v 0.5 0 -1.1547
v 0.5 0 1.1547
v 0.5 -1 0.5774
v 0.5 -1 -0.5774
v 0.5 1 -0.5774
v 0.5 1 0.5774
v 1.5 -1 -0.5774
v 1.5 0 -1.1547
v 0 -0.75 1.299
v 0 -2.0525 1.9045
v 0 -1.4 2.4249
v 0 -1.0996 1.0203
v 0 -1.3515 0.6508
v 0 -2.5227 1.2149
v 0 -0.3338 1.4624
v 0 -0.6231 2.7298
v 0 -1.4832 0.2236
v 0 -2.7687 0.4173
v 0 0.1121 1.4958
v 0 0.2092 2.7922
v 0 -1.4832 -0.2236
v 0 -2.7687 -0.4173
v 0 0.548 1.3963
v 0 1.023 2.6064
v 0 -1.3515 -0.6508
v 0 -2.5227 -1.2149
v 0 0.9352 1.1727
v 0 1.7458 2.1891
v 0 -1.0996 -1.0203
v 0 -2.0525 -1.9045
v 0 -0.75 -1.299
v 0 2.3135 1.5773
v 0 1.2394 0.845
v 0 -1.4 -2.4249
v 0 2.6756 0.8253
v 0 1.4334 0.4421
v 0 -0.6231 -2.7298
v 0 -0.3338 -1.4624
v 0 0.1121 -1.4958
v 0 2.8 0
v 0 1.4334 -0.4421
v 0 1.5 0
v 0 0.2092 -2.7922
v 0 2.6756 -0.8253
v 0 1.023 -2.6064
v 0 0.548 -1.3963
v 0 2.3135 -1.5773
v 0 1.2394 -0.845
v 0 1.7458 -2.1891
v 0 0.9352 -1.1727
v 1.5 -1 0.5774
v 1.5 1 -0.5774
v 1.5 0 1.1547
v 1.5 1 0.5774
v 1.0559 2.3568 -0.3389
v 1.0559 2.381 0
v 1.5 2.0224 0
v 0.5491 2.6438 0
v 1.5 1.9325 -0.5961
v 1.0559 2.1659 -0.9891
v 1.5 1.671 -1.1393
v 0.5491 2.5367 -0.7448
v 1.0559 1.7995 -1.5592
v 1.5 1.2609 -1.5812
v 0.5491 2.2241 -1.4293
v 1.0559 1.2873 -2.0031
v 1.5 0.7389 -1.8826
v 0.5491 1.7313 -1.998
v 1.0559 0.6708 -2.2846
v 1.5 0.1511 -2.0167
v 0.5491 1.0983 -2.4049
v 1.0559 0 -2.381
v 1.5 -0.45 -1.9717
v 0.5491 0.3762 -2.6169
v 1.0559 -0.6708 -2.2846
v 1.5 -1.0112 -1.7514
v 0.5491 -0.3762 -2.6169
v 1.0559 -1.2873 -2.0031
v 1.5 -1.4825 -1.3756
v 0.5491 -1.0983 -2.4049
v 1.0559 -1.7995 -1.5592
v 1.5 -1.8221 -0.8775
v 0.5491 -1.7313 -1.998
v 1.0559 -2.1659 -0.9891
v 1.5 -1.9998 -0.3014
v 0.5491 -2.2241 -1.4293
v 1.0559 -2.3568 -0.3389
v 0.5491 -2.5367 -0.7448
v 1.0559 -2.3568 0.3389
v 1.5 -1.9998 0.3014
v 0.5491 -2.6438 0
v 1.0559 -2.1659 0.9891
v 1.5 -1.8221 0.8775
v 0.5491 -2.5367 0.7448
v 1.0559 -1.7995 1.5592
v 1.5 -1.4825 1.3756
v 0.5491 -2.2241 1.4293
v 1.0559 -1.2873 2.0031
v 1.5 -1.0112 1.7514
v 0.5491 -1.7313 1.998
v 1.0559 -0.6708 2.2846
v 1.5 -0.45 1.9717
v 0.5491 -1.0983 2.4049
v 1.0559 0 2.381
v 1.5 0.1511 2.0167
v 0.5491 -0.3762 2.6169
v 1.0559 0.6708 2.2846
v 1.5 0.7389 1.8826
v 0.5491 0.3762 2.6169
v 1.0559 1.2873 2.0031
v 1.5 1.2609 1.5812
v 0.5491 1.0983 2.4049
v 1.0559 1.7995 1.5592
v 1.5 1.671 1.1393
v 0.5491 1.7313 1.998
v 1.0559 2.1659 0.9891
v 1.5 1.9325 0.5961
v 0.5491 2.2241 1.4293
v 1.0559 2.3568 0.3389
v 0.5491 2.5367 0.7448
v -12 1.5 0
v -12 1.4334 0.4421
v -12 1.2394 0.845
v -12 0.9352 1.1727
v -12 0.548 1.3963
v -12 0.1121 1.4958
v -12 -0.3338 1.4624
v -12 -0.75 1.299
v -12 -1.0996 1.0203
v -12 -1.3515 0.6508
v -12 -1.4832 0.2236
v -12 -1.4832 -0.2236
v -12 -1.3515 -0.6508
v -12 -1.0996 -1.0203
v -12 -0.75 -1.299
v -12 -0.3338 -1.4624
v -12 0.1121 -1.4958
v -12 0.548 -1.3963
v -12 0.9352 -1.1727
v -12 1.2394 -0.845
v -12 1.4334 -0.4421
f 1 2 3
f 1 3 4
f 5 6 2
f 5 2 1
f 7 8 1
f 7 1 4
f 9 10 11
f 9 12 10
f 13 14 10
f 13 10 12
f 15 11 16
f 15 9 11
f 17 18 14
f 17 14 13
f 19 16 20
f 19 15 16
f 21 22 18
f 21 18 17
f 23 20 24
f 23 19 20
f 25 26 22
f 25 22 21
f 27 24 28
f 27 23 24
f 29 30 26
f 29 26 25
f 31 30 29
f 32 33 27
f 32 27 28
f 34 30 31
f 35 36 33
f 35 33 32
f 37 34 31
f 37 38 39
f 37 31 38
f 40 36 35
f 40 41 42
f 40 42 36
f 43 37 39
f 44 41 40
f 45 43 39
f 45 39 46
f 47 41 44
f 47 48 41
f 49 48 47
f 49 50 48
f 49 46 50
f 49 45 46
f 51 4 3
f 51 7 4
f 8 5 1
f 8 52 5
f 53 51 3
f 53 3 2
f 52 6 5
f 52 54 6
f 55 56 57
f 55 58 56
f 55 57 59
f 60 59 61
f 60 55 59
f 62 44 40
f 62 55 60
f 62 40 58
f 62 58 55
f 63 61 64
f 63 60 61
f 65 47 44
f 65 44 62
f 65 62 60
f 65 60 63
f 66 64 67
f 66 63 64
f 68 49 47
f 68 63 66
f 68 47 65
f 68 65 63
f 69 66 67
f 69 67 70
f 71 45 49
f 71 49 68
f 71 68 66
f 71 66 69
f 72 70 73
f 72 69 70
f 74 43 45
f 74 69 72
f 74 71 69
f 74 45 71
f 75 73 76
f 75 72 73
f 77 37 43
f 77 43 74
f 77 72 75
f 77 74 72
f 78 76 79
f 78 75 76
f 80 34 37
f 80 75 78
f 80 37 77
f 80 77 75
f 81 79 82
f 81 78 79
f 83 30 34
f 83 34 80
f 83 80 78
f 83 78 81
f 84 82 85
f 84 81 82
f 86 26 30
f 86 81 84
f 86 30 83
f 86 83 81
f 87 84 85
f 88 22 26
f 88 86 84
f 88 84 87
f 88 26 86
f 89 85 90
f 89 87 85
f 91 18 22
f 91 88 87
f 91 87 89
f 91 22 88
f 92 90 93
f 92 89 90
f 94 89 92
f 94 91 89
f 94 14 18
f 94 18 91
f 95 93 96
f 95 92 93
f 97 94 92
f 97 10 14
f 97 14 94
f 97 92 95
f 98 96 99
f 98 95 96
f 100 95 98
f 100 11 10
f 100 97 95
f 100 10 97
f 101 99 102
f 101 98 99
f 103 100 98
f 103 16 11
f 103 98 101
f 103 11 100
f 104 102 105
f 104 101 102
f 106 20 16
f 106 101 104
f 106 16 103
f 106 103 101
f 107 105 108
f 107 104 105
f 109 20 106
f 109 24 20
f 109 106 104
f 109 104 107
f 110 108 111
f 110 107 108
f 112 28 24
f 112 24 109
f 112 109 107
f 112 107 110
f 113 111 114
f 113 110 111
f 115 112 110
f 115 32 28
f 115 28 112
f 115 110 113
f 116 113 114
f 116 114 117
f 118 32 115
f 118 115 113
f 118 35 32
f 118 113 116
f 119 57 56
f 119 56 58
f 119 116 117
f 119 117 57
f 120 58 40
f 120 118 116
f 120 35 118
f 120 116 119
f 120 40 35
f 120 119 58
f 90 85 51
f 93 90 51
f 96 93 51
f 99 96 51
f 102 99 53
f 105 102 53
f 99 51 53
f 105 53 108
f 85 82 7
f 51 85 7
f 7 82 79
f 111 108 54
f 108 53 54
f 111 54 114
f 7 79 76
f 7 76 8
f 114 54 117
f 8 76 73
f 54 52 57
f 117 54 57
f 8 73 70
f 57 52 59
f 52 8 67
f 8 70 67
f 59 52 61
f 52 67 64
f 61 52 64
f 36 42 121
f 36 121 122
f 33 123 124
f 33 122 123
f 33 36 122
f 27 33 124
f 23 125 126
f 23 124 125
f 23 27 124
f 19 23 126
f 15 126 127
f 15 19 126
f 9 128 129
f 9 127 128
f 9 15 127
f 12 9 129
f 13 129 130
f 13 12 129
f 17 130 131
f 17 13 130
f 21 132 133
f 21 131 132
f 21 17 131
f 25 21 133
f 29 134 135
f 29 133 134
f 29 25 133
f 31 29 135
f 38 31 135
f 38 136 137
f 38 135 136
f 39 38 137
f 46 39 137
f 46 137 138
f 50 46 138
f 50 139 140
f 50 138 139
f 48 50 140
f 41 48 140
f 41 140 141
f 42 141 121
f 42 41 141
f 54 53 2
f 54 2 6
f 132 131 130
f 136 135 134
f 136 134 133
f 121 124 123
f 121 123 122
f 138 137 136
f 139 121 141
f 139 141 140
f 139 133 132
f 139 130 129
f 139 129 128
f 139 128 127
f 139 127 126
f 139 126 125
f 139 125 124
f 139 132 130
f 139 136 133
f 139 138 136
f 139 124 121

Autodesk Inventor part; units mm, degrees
ref_plane "YZ Plane" through (0, 0, 0) normal (1, 0, 0) x (0, 1, 0)
ref_plane "XZ Plane" through (0, 0, 0) normal (0, 1, 0) x (-1, 0, 0)
ref_plane "XY Plane" through (0, 0, 0) normal (0, 0, 1) x (1, 0, 0)
sketch "Sketch1" plane through (0, 0, 0) normal (0, 0, 1) x (1, 0, 0)
  line L0 (0, 0) -> (-12, 0)
  line L1 (-12, 0) -> (-12, 1.5)
  line L2 (-12, 1.5) -> (0, 1.5)
  line L3 (0, 1.5) -> (0, 0)
  line L4 (0, 0) -> (1.5, 0)
  line L5 (1.5, 0) -> (1.5, 2.8)
  line L6 (1.5, 2.8) -> (0, 2.8)
  line L7 (0, 2.8) -> (0, 0)
  circle A0 centre (-0.5, 0) radius 2.8443
  point P0 (1.5, 2.0224)
  dimension "d0" = 12
  dimension "d1" = 1.5
  dimension "d2" = 2.8
  dimension "d3" = 1.5
  dimension "d4" = 0.5
revolve "Revolution1" add sketch "Sketch1" angle 360 about axis through (0, 0, 0) along (-1, 0, 0) contours L0 A0 L2 L3 | L3 L7 A0 L5 L4 | L0 L1 L2 A0
thread "Thread1" size "M3x0.5" class "6g" standard "ANSI Metric M Profile" full length
sketch "Sketch2" plane through (1.5, 0, 0) normal (1, 0, 0) x (0, 0, -1)
  line L0 (0.5774, 1) -> (1.1547, 0)
  line L1 (1.1547, 0) -> (0.5774, -1)
  line L2 (0.5774, -1) -> (-0.5774, -1)
  line L3 (-0.5774, -1) -> (-1.1547, 0)
  line L4 (-1.1547, 0) -> (-0.5774, 1)
  line L5 (-0.5774, 1) -> (0.5774, 1)
  point P0 (0, 0)
  point P1 (0, 0)
  point P2 (0, -1)
  dimension "d8" = 2
extrude "Extrusion1" cut sketch "Sketch2" against normal blind 1
properties part number "M3 x 12 Button"
